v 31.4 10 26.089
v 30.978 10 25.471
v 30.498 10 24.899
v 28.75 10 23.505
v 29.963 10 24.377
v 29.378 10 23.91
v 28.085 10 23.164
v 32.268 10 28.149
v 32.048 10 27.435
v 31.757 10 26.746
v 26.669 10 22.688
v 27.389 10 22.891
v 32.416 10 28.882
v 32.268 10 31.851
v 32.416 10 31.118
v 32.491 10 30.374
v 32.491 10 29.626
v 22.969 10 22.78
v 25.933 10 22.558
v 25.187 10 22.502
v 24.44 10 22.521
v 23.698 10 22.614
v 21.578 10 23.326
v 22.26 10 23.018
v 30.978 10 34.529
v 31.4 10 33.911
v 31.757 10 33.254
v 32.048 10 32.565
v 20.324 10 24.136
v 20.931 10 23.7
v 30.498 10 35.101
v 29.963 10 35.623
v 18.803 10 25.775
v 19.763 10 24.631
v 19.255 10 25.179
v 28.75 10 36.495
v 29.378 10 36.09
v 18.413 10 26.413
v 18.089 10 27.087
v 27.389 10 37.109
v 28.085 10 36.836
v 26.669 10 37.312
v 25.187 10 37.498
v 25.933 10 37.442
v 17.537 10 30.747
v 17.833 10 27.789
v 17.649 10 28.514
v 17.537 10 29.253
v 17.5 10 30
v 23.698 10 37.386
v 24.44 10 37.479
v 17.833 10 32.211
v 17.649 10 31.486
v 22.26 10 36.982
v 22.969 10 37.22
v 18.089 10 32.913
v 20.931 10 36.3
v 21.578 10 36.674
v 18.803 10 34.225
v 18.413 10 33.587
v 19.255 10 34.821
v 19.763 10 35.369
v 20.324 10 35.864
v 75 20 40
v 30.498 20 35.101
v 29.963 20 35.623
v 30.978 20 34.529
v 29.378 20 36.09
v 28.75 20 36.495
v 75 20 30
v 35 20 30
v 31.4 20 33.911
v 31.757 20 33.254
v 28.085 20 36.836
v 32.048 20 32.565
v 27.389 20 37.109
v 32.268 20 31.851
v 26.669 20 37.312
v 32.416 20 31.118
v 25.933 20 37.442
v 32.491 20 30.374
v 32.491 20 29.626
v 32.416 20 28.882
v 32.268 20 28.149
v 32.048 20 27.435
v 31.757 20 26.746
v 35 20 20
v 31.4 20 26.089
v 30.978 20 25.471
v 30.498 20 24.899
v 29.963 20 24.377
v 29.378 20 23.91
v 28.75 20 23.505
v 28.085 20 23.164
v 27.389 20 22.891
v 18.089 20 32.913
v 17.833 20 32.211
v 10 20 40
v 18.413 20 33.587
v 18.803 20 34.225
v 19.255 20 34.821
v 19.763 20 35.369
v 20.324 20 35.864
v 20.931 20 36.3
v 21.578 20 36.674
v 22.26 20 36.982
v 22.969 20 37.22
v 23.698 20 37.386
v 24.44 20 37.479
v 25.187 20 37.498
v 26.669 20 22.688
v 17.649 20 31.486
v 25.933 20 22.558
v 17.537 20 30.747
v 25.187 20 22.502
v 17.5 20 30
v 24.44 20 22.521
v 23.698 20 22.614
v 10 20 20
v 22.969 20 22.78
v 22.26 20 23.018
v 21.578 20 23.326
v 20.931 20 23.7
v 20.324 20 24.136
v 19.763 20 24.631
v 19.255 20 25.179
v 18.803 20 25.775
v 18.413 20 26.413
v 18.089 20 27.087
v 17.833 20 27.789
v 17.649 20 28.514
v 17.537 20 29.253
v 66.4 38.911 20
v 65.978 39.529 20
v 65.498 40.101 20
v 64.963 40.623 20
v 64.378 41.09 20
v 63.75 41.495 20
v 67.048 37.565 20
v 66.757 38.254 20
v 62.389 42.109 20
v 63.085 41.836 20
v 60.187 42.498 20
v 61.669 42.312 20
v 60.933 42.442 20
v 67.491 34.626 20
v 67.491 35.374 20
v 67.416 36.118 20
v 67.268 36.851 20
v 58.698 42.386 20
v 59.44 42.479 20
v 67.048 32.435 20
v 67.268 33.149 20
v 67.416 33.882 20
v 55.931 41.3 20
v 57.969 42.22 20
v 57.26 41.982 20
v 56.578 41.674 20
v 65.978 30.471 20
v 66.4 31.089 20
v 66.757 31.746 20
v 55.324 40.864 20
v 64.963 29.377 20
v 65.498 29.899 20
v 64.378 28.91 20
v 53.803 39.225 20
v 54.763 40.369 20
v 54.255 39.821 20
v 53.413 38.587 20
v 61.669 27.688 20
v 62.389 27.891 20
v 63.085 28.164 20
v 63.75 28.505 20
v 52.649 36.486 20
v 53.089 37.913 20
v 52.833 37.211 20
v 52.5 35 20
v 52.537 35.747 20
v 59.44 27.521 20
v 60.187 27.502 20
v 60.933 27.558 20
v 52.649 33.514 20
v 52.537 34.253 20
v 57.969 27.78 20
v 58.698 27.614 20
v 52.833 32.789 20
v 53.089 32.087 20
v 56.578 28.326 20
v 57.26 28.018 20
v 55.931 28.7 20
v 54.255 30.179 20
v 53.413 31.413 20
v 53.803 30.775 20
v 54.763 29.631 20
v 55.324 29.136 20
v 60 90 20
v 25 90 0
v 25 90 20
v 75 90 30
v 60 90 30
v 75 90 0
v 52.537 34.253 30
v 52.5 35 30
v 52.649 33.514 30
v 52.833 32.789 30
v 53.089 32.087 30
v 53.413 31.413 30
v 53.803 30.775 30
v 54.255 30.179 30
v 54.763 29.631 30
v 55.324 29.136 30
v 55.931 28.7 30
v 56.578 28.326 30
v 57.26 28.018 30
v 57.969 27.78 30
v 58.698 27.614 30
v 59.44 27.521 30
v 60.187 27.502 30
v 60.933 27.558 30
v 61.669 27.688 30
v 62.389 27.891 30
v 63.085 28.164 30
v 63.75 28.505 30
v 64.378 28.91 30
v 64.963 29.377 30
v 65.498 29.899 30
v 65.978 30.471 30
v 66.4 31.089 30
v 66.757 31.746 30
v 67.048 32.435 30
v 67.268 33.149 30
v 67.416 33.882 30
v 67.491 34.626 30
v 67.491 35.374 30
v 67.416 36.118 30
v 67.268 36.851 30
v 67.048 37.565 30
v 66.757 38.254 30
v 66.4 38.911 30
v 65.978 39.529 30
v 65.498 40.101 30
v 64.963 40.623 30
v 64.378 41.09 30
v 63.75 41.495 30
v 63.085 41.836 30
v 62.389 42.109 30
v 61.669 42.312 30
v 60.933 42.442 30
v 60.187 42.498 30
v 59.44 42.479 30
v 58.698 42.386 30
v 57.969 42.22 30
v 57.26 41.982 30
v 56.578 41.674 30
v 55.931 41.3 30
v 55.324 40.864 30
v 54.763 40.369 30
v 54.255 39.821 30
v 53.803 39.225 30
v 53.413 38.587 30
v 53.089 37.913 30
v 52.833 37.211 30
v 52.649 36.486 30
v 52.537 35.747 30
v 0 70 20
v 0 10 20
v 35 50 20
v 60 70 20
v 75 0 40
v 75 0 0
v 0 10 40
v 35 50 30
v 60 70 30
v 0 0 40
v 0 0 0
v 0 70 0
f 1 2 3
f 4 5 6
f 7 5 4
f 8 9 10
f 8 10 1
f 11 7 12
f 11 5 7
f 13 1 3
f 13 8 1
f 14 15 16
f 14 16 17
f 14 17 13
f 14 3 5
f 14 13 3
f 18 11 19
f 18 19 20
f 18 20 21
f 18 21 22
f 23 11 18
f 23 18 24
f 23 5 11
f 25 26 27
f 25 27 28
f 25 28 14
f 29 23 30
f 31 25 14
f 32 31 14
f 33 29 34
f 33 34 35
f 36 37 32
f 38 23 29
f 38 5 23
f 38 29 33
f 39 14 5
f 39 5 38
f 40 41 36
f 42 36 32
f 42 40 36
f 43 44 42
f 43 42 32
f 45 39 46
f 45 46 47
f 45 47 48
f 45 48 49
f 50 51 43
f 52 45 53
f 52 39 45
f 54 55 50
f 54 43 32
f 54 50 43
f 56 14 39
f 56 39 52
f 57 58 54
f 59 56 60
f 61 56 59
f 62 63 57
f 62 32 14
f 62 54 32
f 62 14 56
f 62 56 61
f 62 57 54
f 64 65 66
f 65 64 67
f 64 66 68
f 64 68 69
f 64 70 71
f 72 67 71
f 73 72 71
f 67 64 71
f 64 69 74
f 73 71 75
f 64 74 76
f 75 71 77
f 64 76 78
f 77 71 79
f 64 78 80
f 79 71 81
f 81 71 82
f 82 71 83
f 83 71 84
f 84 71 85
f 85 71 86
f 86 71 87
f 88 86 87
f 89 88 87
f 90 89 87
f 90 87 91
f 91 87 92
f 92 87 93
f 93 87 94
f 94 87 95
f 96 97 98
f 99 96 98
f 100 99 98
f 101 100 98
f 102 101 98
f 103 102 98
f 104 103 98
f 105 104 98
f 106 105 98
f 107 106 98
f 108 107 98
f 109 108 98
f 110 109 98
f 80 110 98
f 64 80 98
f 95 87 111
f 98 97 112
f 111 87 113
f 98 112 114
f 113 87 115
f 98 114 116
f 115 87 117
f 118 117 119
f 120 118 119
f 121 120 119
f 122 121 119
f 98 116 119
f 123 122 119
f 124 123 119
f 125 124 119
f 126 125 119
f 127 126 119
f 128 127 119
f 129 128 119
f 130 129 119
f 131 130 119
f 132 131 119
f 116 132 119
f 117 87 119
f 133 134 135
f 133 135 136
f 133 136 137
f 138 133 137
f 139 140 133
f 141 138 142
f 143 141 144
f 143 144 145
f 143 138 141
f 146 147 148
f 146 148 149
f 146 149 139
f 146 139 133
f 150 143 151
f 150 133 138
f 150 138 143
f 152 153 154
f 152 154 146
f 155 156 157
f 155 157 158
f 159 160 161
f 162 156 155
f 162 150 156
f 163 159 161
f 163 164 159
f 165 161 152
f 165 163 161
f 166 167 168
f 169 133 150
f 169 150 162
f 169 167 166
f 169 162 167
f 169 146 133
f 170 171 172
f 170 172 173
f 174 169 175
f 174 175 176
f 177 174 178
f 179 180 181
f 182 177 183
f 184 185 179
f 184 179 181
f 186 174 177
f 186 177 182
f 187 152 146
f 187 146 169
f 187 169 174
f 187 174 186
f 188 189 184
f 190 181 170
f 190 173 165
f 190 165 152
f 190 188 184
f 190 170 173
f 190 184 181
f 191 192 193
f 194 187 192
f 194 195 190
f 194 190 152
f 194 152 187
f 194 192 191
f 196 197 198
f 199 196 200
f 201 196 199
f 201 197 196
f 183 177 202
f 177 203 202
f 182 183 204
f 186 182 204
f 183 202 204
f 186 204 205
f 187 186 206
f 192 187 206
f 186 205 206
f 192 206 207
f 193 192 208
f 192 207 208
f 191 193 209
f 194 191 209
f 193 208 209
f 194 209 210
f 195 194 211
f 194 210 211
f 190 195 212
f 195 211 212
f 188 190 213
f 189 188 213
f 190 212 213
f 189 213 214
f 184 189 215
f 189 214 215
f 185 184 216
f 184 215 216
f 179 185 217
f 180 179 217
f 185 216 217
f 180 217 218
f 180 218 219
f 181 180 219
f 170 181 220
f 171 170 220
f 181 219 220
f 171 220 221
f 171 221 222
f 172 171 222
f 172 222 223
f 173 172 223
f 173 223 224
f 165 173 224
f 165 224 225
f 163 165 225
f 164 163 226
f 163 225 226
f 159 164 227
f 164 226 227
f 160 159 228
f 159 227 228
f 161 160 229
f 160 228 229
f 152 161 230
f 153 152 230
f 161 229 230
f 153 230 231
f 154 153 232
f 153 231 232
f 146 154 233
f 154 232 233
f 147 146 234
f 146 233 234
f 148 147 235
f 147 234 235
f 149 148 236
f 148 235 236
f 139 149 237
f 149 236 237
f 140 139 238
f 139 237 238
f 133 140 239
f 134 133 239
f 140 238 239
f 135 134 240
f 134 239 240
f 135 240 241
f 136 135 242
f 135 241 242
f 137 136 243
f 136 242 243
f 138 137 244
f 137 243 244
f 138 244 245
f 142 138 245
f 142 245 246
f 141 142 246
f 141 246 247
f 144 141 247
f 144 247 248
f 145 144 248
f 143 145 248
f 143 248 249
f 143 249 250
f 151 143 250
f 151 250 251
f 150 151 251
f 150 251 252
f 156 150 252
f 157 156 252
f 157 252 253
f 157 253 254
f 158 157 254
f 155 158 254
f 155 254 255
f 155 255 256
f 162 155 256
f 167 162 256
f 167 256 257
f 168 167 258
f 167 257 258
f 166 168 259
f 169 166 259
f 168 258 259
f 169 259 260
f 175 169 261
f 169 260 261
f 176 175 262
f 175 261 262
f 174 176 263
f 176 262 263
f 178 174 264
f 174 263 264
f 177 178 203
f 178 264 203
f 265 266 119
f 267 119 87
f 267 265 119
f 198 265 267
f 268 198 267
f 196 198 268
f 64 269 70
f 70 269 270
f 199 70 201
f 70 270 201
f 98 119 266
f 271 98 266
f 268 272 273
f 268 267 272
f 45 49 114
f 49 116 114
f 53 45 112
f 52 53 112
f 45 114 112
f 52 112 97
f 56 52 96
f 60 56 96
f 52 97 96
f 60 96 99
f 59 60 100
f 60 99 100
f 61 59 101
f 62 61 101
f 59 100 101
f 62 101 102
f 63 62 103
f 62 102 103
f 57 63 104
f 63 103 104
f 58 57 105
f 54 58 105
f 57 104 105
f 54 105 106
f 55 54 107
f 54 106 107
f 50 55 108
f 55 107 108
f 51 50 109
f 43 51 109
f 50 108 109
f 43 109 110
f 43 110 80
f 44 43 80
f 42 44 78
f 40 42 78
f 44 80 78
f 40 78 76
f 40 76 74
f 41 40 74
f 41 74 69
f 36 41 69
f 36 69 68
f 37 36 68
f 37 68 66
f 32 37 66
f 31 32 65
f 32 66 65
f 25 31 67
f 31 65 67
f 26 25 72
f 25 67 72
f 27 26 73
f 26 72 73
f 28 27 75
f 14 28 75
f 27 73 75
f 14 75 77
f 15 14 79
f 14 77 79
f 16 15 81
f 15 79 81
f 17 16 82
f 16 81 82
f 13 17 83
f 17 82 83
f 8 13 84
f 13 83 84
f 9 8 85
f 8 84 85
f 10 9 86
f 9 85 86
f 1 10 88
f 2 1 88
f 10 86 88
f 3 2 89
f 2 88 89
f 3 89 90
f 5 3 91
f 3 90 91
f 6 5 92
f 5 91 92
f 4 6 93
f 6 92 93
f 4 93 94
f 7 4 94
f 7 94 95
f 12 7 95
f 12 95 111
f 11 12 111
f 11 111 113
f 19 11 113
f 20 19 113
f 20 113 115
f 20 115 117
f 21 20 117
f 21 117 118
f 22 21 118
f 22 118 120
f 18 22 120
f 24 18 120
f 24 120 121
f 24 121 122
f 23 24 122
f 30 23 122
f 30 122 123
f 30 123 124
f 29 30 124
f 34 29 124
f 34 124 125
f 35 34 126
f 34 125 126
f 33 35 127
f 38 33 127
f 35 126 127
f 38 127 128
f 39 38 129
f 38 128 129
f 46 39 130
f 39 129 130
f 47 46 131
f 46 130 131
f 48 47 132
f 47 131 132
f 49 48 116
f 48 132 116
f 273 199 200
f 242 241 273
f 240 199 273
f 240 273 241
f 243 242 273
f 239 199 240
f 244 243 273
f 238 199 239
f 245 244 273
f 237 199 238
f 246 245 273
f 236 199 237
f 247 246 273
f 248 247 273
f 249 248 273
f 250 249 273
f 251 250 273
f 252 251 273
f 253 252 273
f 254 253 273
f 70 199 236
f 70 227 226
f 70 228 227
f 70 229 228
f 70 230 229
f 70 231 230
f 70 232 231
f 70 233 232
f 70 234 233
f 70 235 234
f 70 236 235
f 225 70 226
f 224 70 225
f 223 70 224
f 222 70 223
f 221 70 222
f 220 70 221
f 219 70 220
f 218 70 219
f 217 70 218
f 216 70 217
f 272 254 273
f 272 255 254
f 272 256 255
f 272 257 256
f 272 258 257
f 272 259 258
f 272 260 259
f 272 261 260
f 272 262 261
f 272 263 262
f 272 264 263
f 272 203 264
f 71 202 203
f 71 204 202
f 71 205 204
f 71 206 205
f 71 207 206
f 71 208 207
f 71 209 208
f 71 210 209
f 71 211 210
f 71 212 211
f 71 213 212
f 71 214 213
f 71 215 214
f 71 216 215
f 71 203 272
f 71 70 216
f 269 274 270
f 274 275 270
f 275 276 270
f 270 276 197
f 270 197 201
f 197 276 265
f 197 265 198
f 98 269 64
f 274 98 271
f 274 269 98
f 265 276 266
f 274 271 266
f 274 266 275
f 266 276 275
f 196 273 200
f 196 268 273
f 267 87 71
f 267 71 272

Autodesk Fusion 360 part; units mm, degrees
sketch "Sketch1" plane through (0, 0, 0) normal (0, 0, 1) x (1, 0, 0) in component "block"
  line L0 (0, 0) -> (75, 0)
  line L1 (75, 0) -> (75, 75)
  line L2 (75, 75) -> (75, 90)
  line L3 (0, 0) -> (0, 70)
  line L4 (0, 70) -> (25, 90)
  line L5 (25, 90) -> (75, 90)
extrude "Extrude1" add sketch "Sketch1" along normal blind 20 in component "block"
sketch "Sketch2" plane through (0, 0, 20) normal (0, 0, 1) x (-1, 0, 0) in component "block"
  line L0 (0, 0) -> (-75, 0)
  line L1 (-75, 0) -> (-75, -90)
  line L2 (-75, -90) -> (-25, -90)
  line L3 (-25, -90) -> (0, -70)
  line L4 (0, -70) -> (0, 0)
  line L5 (-75, -20) -> (-35, -20)
  line L6 (-35, -20) -> (-35, -50)
  line L7 (-35, -50) -> (-60, -70)
  line L8 (-60, -70) -> (-60, -90)
extrude "Extrude2" add sketch "Sketch2" along normal blind 10 contours L1 L2 L5 L6 L7 L8 in component "block"
sketch "Sketch3" plane through (0, 0, 20) normal (0, 0, 1) x (-1, 0, 0) in component "block"
  line L0 (-60, -70) -> (-60, -90)
  line L1 (-60, -90) -> (-25, -90)
  line L2 (-25, -90) -> (0, -70)
  line L3 (0, -70) -> (0, 0)
  line L4 (0, 0) -> (-75, 0)
  line L5 (-75, 0) -> (-75, -20)
  line L6 (-75, -20) -> (-35, -20)
  line L7 (-35, -20) -> (-35, -50)
  line L8 (-35, -50) -> (-60, -70)
  line L9 (-35, -20) -> (-10, -20)
  line L10 (-10, -20) -> (0, -10)
extrude "Extrude3" add sketch "Sketch3" along normal blind 20 contours L3 L4 L5 L6 L9 L10 in component "block"
sketch "Sketch4" plane through (0, 0, 30) normal (0, 0, 1) x (-1, 0, 0) in component "block"
  line L0 (-75, -20) -> (-75, -90)
  line L1 (-75, -90) -> (-60, -90)
  line L2 (-60, -90) -> (-60, -70)
  line L3 (-60, -70) -> (-35, -50)
  line L4 (-35, -50) -> (-35, -20)
  line L5 (-35, -20) -> (-75, -20)
  circle A0 centre (-60, -35) radius 7.5
  dimension "d7" = 15
extrude "Extrude4" cut sketch "Sketch4" against normal blind 10 contours A0 in component "block"
sketch "Sketch5" plane through (0, 20, 0) normal (0, 1, 0) x (-1, 0, 0) in component "block"
  line L0 (-75, 30) -> (-35, 30)
  line L1 (-35, 30) -> (-35, 20)
  line L2 (-35, 20) -> (-10, 20)
  line L3 (-10, 20) -> (-10, 40)
  line L4 (-10, 40) -> (-75, 40)
  line L5 (-75, 40) -> (-75, 30)
  circle A0 centre (-25, 30) radius 7.5
  dimension "d11" = 15
extrude "Extrude5" cut sketch "Sketch5" against normal blind 10 contours A0 in component "block"
component "block" placed x (1, 0, 0) y (0, 1, 0) z (0, 0, 1) at (0, 0, 0)
